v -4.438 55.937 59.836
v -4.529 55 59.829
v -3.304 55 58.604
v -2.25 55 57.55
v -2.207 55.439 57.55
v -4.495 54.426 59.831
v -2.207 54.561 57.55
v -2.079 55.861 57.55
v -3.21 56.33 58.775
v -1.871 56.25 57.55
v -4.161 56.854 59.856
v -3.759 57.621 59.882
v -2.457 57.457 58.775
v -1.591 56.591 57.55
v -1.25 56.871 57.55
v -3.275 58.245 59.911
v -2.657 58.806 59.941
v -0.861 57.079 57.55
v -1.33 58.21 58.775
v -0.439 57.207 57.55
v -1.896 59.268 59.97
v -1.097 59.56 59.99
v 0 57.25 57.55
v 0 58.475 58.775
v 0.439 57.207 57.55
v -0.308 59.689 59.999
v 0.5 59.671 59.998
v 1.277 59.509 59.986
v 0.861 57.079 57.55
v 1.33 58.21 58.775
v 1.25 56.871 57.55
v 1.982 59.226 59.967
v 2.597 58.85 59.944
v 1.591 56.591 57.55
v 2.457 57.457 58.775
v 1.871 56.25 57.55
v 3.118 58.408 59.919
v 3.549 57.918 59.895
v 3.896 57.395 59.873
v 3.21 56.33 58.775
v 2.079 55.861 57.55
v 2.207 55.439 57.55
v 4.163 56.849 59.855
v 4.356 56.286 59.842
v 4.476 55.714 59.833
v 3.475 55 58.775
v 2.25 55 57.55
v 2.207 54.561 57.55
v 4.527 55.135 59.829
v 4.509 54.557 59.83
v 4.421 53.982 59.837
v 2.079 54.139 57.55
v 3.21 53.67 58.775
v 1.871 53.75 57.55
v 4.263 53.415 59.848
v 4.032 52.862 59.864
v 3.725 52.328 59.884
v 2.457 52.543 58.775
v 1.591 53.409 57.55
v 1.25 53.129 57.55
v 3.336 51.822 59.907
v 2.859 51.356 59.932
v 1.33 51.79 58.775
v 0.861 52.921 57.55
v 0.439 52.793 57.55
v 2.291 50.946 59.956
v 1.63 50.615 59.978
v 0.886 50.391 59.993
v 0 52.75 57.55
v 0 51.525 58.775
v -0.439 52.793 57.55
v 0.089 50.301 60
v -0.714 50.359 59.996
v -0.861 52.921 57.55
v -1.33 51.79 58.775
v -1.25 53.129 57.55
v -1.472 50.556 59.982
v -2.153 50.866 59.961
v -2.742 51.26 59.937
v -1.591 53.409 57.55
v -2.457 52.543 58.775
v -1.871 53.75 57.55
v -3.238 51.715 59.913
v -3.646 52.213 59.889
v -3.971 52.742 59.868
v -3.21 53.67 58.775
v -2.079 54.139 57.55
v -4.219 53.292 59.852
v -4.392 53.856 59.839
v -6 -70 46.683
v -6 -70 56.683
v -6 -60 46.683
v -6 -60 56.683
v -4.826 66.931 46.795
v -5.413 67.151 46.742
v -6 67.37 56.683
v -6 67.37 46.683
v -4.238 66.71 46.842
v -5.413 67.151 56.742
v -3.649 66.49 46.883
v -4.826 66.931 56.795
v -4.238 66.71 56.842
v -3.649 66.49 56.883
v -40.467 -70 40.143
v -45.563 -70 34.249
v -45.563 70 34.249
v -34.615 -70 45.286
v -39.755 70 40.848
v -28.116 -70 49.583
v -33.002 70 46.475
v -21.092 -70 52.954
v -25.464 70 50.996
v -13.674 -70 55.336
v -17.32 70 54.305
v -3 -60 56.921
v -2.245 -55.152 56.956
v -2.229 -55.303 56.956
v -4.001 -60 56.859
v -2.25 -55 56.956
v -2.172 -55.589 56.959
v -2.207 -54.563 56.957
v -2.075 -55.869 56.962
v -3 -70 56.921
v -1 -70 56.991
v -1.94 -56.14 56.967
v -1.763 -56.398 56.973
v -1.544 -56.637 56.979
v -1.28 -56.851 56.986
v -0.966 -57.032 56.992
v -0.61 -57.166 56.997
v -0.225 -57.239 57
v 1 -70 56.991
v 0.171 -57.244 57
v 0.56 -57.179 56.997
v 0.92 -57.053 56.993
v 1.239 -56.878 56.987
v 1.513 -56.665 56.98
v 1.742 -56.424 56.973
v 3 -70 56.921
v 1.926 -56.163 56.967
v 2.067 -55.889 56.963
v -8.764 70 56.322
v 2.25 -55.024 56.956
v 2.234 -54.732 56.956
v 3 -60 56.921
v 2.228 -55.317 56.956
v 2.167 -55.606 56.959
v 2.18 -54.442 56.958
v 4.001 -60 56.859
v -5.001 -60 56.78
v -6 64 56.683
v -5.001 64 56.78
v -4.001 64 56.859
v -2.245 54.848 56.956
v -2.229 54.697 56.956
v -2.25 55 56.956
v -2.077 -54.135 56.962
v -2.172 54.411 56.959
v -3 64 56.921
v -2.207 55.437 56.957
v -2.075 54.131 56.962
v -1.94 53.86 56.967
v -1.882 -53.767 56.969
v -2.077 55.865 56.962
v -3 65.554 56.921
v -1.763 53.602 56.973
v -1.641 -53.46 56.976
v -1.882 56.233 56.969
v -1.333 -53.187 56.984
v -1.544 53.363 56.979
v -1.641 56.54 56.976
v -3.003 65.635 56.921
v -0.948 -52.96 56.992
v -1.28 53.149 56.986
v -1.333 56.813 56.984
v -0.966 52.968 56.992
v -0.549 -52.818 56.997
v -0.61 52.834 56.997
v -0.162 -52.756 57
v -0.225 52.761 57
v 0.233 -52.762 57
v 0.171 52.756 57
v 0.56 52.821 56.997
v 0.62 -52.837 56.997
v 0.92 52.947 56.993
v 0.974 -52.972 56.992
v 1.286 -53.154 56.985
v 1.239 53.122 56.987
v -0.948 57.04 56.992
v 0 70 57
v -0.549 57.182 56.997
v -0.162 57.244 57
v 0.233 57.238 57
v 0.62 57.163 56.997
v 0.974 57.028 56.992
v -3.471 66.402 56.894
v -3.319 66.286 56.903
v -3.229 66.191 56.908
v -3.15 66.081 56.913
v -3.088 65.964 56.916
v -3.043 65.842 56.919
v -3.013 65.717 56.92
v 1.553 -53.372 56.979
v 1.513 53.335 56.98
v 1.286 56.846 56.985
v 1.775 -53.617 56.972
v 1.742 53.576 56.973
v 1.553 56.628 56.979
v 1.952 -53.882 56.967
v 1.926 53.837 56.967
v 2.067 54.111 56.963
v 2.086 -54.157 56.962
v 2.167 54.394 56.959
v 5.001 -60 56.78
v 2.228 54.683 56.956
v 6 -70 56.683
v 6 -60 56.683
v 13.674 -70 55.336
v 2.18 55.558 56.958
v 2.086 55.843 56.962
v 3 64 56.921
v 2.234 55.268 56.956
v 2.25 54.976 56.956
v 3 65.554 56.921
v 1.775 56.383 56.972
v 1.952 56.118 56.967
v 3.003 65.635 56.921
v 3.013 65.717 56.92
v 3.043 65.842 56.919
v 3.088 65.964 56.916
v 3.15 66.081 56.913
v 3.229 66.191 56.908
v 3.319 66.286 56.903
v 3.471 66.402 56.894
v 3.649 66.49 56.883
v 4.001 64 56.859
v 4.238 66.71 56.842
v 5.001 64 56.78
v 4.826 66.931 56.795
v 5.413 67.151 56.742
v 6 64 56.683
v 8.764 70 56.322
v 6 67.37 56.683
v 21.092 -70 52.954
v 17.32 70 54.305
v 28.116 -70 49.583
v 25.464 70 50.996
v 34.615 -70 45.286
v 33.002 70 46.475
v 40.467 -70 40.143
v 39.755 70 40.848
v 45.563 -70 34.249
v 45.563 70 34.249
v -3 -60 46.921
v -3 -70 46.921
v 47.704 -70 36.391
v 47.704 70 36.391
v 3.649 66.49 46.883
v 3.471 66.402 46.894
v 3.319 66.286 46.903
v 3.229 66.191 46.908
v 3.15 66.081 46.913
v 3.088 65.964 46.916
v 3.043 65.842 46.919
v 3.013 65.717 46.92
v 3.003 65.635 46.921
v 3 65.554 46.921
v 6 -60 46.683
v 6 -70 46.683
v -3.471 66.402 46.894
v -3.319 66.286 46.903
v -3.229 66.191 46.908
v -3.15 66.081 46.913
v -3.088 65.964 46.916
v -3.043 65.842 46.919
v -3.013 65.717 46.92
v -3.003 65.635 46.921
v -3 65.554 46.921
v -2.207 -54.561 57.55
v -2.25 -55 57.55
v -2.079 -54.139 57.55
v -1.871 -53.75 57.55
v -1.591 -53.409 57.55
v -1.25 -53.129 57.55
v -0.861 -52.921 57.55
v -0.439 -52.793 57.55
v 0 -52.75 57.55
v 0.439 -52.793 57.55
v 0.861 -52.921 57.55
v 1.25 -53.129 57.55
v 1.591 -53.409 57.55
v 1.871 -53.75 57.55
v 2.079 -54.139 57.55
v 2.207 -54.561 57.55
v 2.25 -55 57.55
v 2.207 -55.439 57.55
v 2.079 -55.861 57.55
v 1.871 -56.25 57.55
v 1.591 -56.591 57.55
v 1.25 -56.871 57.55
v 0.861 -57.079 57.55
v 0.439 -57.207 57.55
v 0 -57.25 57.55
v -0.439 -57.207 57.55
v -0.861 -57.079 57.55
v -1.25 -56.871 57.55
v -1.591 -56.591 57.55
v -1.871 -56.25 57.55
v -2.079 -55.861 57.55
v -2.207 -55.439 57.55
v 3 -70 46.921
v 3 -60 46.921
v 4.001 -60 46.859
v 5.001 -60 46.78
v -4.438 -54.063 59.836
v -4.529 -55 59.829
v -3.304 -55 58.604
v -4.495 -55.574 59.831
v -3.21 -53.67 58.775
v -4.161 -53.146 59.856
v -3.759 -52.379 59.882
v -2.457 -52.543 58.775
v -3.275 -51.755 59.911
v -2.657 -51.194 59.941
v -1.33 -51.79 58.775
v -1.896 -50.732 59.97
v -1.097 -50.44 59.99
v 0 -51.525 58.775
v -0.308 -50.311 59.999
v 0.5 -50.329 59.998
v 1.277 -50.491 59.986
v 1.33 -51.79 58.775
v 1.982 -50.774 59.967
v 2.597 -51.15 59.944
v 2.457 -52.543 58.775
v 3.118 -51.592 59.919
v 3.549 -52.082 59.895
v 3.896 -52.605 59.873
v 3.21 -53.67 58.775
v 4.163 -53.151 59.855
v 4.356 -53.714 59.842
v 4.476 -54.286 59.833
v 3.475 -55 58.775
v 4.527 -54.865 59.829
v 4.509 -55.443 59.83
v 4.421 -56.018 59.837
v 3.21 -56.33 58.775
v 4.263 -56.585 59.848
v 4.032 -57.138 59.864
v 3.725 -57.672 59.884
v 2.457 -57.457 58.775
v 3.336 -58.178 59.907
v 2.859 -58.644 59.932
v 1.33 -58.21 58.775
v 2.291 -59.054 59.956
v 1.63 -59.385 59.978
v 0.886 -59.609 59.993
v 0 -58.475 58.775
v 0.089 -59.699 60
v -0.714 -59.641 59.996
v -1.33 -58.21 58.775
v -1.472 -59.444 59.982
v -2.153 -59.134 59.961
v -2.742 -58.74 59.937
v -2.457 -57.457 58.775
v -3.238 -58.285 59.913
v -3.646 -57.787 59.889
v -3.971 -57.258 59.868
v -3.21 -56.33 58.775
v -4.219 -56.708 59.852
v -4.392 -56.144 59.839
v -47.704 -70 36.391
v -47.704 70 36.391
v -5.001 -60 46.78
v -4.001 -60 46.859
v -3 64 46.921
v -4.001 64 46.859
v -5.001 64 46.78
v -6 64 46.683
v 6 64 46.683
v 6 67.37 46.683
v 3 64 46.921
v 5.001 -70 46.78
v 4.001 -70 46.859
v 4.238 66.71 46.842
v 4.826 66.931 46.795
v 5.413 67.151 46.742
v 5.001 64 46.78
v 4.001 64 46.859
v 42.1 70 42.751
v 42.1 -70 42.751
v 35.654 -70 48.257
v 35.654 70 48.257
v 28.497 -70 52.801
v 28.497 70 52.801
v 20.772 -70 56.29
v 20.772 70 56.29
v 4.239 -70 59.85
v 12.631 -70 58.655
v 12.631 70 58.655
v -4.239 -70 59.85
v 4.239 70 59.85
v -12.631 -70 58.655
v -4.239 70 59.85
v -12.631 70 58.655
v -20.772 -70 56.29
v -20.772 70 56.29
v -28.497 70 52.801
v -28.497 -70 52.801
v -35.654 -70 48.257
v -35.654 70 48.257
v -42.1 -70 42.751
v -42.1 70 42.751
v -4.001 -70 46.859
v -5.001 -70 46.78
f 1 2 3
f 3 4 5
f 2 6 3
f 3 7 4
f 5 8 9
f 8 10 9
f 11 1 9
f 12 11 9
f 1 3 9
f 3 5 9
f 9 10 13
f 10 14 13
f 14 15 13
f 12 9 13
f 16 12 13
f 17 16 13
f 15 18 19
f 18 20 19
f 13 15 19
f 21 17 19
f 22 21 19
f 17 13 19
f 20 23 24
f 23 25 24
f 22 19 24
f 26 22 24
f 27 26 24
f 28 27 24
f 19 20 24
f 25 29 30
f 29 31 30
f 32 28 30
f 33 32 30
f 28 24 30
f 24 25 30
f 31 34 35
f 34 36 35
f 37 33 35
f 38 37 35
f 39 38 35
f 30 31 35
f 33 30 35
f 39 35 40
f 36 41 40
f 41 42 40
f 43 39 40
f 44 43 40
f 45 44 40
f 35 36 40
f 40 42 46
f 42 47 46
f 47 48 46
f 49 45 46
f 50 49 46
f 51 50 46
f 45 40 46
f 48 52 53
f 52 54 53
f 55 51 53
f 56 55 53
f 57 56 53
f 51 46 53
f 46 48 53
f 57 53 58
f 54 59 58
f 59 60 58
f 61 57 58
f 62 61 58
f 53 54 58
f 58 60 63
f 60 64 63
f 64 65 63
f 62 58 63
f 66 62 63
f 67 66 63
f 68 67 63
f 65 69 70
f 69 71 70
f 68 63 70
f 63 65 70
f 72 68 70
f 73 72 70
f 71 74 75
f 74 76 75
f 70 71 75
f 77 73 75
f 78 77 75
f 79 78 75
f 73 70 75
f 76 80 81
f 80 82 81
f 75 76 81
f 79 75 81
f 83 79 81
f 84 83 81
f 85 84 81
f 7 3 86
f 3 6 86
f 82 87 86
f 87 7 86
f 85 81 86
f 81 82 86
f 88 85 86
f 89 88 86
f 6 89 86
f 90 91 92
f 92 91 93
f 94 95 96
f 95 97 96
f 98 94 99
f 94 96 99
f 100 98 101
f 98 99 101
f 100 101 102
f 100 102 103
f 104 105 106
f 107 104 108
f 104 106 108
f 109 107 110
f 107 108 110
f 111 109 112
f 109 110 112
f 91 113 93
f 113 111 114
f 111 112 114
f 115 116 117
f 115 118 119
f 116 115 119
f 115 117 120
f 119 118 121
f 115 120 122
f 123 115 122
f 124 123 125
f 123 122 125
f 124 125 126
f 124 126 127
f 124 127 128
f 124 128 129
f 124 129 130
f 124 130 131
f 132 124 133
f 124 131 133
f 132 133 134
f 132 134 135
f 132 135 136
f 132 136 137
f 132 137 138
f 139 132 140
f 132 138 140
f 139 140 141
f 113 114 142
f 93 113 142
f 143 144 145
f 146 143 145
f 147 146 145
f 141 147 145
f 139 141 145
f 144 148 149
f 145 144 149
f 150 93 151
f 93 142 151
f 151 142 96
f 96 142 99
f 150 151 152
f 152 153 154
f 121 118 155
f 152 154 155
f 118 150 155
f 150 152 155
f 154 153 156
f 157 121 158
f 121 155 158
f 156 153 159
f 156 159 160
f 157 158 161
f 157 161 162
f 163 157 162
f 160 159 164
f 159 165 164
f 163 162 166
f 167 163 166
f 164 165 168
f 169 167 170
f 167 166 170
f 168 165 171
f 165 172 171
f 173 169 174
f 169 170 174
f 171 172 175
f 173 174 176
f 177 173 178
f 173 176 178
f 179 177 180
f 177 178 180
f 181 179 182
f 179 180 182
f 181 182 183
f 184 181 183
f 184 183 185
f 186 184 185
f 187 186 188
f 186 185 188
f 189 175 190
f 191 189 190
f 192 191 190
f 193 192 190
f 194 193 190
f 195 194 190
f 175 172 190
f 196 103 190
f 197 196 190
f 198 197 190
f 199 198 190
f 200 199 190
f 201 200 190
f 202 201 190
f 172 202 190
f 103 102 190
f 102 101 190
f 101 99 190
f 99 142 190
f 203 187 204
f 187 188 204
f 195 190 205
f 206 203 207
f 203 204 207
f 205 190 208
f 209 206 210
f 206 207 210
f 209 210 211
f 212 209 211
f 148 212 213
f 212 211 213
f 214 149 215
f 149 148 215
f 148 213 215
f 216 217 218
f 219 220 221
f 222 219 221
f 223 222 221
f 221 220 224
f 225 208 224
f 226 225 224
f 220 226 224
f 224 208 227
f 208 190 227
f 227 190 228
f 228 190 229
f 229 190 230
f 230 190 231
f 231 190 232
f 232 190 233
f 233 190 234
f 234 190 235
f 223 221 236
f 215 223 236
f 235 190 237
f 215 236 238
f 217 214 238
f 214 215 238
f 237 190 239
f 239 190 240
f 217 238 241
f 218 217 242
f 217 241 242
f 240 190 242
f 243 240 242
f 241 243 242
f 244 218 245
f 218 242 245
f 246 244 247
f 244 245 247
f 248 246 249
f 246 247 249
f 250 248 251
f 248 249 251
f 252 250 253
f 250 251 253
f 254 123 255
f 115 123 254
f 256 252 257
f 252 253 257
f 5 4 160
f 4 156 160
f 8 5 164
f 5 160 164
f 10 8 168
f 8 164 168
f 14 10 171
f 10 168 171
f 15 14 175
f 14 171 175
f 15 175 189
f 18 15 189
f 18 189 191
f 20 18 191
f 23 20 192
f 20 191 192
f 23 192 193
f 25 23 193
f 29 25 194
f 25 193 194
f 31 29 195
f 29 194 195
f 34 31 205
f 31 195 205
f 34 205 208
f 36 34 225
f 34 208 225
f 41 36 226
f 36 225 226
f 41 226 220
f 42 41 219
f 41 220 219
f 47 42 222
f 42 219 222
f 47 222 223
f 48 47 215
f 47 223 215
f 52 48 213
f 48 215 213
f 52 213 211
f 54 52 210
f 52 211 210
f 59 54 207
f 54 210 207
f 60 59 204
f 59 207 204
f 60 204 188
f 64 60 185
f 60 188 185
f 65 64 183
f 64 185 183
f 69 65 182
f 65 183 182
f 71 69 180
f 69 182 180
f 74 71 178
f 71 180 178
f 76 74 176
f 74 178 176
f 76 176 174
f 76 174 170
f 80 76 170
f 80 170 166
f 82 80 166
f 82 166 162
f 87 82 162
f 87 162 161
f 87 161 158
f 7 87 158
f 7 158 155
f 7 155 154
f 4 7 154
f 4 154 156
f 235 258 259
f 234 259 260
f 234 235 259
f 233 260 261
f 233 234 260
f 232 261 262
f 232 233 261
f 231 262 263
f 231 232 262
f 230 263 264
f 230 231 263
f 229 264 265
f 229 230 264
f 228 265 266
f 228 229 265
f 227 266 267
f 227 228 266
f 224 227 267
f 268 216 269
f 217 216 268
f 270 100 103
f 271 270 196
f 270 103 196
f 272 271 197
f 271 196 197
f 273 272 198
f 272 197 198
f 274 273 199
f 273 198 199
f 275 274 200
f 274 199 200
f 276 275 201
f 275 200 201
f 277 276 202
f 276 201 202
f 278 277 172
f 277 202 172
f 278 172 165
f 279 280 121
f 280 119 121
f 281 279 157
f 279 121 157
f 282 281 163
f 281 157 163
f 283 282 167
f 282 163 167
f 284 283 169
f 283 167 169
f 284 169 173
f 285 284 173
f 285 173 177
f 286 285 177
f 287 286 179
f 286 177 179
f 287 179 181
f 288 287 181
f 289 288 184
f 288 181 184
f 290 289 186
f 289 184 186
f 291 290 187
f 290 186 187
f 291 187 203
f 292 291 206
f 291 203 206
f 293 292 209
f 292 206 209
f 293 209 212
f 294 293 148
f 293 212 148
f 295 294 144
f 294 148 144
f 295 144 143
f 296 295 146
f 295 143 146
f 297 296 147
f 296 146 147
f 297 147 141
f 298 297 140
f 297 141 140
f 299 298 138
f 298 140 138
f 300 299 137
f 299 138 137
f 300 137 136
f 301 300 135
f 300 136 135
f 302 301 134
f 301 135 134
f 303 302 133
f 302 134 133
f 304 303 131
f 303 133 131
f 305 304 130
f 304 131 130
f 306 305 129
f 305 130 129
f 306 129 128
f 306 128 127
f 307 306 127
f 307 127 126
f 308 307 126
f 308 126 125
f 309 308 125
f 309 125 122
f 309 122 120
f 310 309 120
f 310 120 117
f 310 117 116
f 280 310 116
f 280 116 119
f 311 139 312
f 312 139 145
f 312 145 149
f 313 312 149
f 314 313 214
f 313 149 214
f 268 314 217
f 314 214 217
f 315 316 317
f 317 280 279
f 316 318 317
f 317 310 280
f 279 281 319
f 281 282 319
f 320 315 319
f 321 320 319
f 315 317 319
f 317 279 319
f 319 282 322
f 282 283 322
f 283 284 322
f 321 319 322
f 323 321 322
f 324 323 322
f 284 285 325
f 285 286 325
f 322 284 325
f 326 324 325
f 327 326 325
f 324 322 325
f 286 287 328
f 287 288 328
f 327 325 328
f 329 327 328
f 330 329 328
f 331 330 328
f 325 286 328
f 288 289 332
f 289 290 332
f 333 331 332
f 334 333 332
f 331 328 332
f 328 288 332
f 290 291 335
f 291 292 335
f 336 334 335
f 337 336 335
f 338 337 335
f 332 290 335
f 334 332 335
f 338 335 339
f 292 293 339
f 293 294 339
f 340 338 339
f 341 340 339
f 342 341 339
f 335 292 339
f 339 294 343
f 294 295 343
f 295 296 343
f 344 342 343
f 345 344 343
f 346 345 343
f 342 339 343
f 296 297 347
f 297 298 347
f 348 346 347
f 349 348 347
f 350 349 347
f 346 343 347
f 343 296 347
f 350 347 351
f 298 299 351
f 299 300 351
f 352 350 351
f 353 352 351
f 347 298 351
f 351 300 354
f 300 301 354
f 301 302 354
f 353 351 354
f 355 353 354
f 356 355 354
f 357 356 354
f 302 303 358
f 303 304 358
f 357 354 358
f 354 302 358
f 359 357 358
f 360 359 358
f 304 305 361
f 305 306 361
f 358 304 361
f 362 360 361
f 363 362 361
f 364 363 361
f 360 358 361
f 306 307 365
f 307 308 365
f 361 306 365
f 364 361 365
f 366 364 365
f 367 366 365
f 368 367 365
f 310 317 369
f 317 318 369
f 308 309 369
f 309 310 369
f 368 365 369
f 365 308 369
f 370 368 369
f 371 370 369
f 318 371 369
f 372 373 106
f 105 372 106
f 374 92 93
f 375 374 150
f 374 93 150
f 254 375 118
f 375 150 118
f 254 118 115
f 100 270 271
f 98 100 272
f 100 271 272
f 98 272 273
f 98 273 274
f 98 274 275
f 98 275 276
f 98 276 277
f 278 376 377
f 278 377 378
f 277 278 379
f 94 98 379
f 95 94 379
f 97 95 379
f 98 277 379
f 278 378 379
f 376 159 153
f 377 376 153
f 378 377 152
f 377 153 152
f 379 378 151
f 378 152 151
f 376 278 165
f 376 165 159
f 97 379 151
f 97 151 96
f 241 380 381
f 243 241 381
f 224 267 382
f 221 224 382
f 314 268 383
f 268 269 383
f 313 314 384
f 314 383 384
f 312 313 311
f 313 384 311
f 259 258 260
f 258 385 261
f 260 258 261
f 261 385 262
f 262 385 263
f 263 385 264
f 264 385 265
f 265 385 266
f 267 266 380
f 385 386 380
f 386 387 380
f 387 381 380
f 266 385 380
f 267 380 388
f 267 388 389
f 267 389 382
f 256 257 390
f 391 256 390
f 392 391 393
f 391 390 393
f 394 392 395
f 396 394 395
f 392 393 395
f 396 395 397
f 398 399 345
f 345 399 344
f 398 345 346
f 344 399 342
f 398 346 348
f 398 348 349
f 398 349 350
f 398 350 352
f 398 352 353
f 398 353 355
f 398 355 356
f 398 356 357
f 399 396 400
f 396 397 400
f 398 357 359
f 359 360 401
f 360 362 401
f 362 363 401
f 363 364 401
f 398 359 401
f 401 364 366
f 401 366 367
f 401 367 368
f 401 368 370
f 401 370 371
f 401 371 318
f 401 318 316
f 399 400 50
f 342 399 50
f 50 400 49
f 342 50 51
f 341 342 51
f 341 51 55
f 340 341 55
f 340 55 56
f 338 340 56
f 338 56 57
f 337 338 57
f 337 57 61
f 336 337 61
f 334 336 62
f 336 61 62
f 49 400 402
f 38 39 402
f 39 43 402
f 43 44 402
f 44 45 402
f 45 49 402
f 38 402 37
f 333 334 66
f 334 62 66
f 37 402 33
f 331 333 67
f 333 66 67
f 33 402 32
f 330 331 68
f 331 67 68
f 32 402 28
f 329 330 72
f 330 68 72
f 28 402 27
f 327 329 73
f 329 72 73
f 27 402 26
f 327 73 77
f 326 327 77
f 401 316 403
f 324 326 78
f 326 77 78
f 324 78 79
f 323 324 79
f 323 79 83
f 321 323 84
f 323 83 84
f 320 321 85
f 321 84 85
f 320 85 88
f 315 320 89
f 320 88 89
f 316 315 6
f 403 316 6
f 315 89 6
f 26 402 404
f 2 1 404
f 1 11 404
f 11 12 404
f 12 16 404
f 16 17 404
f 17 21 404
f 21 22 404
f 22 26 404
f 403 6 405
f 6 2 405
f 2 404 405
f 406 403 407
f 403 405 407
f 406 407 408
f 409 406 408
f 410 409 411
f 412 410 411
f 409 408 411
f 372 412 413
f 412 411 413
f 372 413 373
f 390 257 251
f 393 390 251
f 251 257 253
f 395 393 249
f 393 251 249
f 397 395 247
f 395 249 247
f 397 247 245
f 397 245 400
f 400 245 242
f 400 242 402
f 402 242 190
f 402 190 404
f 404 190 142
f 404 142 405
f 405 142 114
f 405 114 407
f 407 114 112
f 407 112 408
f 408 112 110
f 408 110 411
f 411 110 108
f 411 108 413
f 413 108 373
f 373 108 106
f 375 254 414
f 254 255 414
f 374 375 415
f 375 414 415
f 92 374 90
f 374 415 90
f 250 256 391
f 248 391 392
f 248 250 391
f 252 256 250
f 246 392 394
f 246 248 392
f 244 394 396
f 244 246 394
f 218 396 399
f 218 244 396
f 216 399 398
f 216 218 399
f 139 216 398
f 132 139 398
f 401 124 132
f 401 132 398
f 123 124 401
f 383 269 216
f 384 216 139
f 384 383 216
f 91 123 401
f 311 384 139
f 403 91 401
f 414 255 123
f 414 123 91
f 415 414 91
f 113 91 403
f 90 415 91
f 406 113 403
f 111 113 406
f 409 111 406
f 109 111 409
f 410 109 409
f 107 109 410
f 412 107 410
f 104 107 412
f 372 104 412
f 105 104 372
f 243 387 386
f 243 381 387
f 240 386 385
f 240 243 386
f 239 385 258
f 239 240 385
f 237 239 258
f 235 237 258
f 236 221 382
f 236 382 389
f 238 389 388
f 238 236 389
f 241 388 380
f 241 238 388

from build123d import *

# Parameters (mm, degrees)
BOSS_EXTRUDE1_DEPTH                                 = 70
BOSS_EXTRUDE2_REACH                                 = 115.806
BOSS_EXTRUDE2_START_RADIUS                          = 57
BOSS_EXTRUDE2_END_RADIUS                            = 57
SKETCH7_W                                           = 3
SKETCH7_H                                           = 10
CSK_FOR_M4_COUNTERSUNK_FLAT_HEAD_SCREW2_D           = 4.5
CSK_FOR_M4_COUNTERSUNK_FLAT_HEAD_SCREW2_DEPTH       = 11.5
CSK_FOR_M4_COUNTERSUNK_FLAT_HEAD_SCREW2_CSINK_D     = 9.4
CSK_FOR_M4_COUNTERSUNK_FLAT_HEAD_SCREW2_CSINK_ANGLE = 90
CSK_FOR_M4_COUNTERSUNK_FLAT_HEAD_SCREW2_TIP         = 1.351936393


with BuildPart() as part:
    # Sketch2 → Boss-Extrude1 (new, symmetric)
    with BuildSketch(Plane(origin=(0, 0, 0), x_dir=(1, 0, 0), z_dir=(0, 1, 0))):
        with BuildLine():
            Line((-47.704446333, -36.390737834), (-45.562994128, -34.249285629))
            ThreePointArc((-45.562994128, -34.249285629), (0, -57), (45.562994128, -34.249285629))
            Line((45.562994128, -34.249285629), (47.704446333, -36.390737834))
            ThreePointArc((47.704446333, -36.390737834), (0, -60), (-47.704446333, -36.390737834))
        make_face()
    extrude(amount=BOSS_EXTRUDE1_DEPTH, both=True)

    # Boss-Extrude2: from a cylinder face, 115.806 long prism both ways, kept between that surface and its translate by the depth
    boss_extrude2_start = Plane(origin=(0, 0.207736, 0), z_dir=(0, -1, 0)) * Cylinder(BOSS_EXTRUDE2_START_RADIUS, 477.027472, mode=Mode.PRIVATE)
    boss_extrude2_end = Plane(origin=(0, 0.207736, -10), z_dir=(0, -1, 0)) * Cylinder(BOSS_EXTRUDE2_END_RADIUS, 477.027472, mode=Mode.PRIVATE)
    # Sketch7 → Boss-Extrude2 (add, from a surface)
    with BuildSketch(Plane.XY, mode=Mode.PRIVATE) as boss_extrude2_sk1:
        with Locations((4.5, -65)):
            Rectangle(SKETCH7_W, SKETCH7_H)
    boss_extrude2_tool1 = extrude(boss_extrude2_sk1.sketch, amount=BOSS_EXTRUDE2_REACH, both=True, mode=Mode.PRIVATE)
    add(((boss_extrude2_tool1 & boss_extrude2_start) - boss_extrude2_end).solids().sort_by_distance((4.5, -65, 51.802164))[0])
    # Sketch7 → Boss-Extrude2 (add, from a surface)
    with BuildSketch(Plane.XY, mode=Mode.PRIVATE) as boss_extrude2_sk2:
        with BuildLine():
            Line((3, 65.553629026), (3, 64))
            Line((3, 64), (6, 64))
            Line((6, 64), (6, 67.370437785))
            Line((6, 67.370437785), (3.649292783, 66.490114182))
            ThreePointArc((3.649292783, 66.490114182), (3.178200993, 66.123406518), (3, 65.553629026))
        make_face()
    boss_extrude2_tool2 = extrude(boss_extrude2_sk2.sketch, amount=BOSS_EXTRUDE2_REACH, both=True, mode=Mode.PRIVATE)
    add(((boss_extrude2_tool2 & boss_extrude2_start) - boss_extrude2_end).solids().sort_by_distance((4.5, -65, 51.802164))[0])
    # Sketch7 → Boss-Extrude2 (add, from a surface)
    with BuildSketch(Plane.XY, mode=Mode.PRIVATE) as boss_extrude2_sk3:
        with BuildLine():
            Line((-3, 65.553629026), (-3, 64))
            Line((-3, 64), (-6, 64))
            Line((-6, 64), (-6, 67.370437785))
            Line((-6, 67.370437785), (-3.649292783, 66.490114182))
            ThreePointArc((-3.649292783, 66.490114182), (-3.178200993, 66.123406518), (-3, 65.553629026))
        make_face()
    boss_extrude2_tool3 = extrude(boss_extrude2_sk3.sketch, amount=BOSS_EXTRUDE2_REACH, both=True, mode=Mode.PRIVATE)
    add(((boss_extrude2_tool3 & boss_extrude2_start) - boss_extrude2_end).solids().sort_by_distance((4.5, -65, 51.802164))[0])
    # Sketch7 → Boss-Extrude2 (add, from a surface)
    with BuildSketch(Plane.XY, mode=Mode.PRIVATE) as boss_extrude2_sk4:
        with Locations((-4.5, -65)):
            Rectangle(SKETCH7_W, SKETCH7_H)
    boss_extrude2_tool4 = extrude(boss_extrude2_sk4.sketch, amount=BOSS_EXTRUDE2_REACH, both=True, mode=Mode.PRIVATE)
    add(((boss_extrude2_tool4 & boss_extrude2_start) - boss_extrude2_end).solids().sort_by_distance((4.5, -65, 51.802164))[0])

    # CSK for M4 Countersunk Flat Head Screw2
    with Locations(Plane(origin=(0, 55, 60), x_dir=(1, 0, 0), z_dir=(0, 0, 1))):
        with Locations((0, 0), (0, -110)):
            CounterSinkHole(CSK_FOR_M4_COUNTERSUNK_FLAT_HEAD_SCREW2_D / 2, CSK_FOR_M4_COUNTERSUNK_FLAT_HEAD_SCREW2_CSINK_D / 2, depth=CSK_FOR_M4_COUNTERSUNK_FLAT_HEAD_SCREW2_DEPTH, counter_sink_angle=CSK_FOR_M4_COUNTERSUNK_FLAT_HEAD_SCREW2_CSINK_ANGLE)
            with Locations((0, 0, -(CSK_FOR_M4_COUNTERSUNK_FLAT_HEAD_SCREW2_DEPTH + CSK_FOR_M4_COUNTERSUNK_FLAT_HEAD_SCREW2_TIP / 2))):  # 118° drill point
                Cone(0, CSK_FOR_M4_COUNTERSUNK_FLAT_HEAD_SCREW2_D / 2, CSK_FOR_M4_COUNTERSUNK_FLAT_HEAD_SCREW2_TIP, mode=Mode.SUBTRACT)


solid = part.part
